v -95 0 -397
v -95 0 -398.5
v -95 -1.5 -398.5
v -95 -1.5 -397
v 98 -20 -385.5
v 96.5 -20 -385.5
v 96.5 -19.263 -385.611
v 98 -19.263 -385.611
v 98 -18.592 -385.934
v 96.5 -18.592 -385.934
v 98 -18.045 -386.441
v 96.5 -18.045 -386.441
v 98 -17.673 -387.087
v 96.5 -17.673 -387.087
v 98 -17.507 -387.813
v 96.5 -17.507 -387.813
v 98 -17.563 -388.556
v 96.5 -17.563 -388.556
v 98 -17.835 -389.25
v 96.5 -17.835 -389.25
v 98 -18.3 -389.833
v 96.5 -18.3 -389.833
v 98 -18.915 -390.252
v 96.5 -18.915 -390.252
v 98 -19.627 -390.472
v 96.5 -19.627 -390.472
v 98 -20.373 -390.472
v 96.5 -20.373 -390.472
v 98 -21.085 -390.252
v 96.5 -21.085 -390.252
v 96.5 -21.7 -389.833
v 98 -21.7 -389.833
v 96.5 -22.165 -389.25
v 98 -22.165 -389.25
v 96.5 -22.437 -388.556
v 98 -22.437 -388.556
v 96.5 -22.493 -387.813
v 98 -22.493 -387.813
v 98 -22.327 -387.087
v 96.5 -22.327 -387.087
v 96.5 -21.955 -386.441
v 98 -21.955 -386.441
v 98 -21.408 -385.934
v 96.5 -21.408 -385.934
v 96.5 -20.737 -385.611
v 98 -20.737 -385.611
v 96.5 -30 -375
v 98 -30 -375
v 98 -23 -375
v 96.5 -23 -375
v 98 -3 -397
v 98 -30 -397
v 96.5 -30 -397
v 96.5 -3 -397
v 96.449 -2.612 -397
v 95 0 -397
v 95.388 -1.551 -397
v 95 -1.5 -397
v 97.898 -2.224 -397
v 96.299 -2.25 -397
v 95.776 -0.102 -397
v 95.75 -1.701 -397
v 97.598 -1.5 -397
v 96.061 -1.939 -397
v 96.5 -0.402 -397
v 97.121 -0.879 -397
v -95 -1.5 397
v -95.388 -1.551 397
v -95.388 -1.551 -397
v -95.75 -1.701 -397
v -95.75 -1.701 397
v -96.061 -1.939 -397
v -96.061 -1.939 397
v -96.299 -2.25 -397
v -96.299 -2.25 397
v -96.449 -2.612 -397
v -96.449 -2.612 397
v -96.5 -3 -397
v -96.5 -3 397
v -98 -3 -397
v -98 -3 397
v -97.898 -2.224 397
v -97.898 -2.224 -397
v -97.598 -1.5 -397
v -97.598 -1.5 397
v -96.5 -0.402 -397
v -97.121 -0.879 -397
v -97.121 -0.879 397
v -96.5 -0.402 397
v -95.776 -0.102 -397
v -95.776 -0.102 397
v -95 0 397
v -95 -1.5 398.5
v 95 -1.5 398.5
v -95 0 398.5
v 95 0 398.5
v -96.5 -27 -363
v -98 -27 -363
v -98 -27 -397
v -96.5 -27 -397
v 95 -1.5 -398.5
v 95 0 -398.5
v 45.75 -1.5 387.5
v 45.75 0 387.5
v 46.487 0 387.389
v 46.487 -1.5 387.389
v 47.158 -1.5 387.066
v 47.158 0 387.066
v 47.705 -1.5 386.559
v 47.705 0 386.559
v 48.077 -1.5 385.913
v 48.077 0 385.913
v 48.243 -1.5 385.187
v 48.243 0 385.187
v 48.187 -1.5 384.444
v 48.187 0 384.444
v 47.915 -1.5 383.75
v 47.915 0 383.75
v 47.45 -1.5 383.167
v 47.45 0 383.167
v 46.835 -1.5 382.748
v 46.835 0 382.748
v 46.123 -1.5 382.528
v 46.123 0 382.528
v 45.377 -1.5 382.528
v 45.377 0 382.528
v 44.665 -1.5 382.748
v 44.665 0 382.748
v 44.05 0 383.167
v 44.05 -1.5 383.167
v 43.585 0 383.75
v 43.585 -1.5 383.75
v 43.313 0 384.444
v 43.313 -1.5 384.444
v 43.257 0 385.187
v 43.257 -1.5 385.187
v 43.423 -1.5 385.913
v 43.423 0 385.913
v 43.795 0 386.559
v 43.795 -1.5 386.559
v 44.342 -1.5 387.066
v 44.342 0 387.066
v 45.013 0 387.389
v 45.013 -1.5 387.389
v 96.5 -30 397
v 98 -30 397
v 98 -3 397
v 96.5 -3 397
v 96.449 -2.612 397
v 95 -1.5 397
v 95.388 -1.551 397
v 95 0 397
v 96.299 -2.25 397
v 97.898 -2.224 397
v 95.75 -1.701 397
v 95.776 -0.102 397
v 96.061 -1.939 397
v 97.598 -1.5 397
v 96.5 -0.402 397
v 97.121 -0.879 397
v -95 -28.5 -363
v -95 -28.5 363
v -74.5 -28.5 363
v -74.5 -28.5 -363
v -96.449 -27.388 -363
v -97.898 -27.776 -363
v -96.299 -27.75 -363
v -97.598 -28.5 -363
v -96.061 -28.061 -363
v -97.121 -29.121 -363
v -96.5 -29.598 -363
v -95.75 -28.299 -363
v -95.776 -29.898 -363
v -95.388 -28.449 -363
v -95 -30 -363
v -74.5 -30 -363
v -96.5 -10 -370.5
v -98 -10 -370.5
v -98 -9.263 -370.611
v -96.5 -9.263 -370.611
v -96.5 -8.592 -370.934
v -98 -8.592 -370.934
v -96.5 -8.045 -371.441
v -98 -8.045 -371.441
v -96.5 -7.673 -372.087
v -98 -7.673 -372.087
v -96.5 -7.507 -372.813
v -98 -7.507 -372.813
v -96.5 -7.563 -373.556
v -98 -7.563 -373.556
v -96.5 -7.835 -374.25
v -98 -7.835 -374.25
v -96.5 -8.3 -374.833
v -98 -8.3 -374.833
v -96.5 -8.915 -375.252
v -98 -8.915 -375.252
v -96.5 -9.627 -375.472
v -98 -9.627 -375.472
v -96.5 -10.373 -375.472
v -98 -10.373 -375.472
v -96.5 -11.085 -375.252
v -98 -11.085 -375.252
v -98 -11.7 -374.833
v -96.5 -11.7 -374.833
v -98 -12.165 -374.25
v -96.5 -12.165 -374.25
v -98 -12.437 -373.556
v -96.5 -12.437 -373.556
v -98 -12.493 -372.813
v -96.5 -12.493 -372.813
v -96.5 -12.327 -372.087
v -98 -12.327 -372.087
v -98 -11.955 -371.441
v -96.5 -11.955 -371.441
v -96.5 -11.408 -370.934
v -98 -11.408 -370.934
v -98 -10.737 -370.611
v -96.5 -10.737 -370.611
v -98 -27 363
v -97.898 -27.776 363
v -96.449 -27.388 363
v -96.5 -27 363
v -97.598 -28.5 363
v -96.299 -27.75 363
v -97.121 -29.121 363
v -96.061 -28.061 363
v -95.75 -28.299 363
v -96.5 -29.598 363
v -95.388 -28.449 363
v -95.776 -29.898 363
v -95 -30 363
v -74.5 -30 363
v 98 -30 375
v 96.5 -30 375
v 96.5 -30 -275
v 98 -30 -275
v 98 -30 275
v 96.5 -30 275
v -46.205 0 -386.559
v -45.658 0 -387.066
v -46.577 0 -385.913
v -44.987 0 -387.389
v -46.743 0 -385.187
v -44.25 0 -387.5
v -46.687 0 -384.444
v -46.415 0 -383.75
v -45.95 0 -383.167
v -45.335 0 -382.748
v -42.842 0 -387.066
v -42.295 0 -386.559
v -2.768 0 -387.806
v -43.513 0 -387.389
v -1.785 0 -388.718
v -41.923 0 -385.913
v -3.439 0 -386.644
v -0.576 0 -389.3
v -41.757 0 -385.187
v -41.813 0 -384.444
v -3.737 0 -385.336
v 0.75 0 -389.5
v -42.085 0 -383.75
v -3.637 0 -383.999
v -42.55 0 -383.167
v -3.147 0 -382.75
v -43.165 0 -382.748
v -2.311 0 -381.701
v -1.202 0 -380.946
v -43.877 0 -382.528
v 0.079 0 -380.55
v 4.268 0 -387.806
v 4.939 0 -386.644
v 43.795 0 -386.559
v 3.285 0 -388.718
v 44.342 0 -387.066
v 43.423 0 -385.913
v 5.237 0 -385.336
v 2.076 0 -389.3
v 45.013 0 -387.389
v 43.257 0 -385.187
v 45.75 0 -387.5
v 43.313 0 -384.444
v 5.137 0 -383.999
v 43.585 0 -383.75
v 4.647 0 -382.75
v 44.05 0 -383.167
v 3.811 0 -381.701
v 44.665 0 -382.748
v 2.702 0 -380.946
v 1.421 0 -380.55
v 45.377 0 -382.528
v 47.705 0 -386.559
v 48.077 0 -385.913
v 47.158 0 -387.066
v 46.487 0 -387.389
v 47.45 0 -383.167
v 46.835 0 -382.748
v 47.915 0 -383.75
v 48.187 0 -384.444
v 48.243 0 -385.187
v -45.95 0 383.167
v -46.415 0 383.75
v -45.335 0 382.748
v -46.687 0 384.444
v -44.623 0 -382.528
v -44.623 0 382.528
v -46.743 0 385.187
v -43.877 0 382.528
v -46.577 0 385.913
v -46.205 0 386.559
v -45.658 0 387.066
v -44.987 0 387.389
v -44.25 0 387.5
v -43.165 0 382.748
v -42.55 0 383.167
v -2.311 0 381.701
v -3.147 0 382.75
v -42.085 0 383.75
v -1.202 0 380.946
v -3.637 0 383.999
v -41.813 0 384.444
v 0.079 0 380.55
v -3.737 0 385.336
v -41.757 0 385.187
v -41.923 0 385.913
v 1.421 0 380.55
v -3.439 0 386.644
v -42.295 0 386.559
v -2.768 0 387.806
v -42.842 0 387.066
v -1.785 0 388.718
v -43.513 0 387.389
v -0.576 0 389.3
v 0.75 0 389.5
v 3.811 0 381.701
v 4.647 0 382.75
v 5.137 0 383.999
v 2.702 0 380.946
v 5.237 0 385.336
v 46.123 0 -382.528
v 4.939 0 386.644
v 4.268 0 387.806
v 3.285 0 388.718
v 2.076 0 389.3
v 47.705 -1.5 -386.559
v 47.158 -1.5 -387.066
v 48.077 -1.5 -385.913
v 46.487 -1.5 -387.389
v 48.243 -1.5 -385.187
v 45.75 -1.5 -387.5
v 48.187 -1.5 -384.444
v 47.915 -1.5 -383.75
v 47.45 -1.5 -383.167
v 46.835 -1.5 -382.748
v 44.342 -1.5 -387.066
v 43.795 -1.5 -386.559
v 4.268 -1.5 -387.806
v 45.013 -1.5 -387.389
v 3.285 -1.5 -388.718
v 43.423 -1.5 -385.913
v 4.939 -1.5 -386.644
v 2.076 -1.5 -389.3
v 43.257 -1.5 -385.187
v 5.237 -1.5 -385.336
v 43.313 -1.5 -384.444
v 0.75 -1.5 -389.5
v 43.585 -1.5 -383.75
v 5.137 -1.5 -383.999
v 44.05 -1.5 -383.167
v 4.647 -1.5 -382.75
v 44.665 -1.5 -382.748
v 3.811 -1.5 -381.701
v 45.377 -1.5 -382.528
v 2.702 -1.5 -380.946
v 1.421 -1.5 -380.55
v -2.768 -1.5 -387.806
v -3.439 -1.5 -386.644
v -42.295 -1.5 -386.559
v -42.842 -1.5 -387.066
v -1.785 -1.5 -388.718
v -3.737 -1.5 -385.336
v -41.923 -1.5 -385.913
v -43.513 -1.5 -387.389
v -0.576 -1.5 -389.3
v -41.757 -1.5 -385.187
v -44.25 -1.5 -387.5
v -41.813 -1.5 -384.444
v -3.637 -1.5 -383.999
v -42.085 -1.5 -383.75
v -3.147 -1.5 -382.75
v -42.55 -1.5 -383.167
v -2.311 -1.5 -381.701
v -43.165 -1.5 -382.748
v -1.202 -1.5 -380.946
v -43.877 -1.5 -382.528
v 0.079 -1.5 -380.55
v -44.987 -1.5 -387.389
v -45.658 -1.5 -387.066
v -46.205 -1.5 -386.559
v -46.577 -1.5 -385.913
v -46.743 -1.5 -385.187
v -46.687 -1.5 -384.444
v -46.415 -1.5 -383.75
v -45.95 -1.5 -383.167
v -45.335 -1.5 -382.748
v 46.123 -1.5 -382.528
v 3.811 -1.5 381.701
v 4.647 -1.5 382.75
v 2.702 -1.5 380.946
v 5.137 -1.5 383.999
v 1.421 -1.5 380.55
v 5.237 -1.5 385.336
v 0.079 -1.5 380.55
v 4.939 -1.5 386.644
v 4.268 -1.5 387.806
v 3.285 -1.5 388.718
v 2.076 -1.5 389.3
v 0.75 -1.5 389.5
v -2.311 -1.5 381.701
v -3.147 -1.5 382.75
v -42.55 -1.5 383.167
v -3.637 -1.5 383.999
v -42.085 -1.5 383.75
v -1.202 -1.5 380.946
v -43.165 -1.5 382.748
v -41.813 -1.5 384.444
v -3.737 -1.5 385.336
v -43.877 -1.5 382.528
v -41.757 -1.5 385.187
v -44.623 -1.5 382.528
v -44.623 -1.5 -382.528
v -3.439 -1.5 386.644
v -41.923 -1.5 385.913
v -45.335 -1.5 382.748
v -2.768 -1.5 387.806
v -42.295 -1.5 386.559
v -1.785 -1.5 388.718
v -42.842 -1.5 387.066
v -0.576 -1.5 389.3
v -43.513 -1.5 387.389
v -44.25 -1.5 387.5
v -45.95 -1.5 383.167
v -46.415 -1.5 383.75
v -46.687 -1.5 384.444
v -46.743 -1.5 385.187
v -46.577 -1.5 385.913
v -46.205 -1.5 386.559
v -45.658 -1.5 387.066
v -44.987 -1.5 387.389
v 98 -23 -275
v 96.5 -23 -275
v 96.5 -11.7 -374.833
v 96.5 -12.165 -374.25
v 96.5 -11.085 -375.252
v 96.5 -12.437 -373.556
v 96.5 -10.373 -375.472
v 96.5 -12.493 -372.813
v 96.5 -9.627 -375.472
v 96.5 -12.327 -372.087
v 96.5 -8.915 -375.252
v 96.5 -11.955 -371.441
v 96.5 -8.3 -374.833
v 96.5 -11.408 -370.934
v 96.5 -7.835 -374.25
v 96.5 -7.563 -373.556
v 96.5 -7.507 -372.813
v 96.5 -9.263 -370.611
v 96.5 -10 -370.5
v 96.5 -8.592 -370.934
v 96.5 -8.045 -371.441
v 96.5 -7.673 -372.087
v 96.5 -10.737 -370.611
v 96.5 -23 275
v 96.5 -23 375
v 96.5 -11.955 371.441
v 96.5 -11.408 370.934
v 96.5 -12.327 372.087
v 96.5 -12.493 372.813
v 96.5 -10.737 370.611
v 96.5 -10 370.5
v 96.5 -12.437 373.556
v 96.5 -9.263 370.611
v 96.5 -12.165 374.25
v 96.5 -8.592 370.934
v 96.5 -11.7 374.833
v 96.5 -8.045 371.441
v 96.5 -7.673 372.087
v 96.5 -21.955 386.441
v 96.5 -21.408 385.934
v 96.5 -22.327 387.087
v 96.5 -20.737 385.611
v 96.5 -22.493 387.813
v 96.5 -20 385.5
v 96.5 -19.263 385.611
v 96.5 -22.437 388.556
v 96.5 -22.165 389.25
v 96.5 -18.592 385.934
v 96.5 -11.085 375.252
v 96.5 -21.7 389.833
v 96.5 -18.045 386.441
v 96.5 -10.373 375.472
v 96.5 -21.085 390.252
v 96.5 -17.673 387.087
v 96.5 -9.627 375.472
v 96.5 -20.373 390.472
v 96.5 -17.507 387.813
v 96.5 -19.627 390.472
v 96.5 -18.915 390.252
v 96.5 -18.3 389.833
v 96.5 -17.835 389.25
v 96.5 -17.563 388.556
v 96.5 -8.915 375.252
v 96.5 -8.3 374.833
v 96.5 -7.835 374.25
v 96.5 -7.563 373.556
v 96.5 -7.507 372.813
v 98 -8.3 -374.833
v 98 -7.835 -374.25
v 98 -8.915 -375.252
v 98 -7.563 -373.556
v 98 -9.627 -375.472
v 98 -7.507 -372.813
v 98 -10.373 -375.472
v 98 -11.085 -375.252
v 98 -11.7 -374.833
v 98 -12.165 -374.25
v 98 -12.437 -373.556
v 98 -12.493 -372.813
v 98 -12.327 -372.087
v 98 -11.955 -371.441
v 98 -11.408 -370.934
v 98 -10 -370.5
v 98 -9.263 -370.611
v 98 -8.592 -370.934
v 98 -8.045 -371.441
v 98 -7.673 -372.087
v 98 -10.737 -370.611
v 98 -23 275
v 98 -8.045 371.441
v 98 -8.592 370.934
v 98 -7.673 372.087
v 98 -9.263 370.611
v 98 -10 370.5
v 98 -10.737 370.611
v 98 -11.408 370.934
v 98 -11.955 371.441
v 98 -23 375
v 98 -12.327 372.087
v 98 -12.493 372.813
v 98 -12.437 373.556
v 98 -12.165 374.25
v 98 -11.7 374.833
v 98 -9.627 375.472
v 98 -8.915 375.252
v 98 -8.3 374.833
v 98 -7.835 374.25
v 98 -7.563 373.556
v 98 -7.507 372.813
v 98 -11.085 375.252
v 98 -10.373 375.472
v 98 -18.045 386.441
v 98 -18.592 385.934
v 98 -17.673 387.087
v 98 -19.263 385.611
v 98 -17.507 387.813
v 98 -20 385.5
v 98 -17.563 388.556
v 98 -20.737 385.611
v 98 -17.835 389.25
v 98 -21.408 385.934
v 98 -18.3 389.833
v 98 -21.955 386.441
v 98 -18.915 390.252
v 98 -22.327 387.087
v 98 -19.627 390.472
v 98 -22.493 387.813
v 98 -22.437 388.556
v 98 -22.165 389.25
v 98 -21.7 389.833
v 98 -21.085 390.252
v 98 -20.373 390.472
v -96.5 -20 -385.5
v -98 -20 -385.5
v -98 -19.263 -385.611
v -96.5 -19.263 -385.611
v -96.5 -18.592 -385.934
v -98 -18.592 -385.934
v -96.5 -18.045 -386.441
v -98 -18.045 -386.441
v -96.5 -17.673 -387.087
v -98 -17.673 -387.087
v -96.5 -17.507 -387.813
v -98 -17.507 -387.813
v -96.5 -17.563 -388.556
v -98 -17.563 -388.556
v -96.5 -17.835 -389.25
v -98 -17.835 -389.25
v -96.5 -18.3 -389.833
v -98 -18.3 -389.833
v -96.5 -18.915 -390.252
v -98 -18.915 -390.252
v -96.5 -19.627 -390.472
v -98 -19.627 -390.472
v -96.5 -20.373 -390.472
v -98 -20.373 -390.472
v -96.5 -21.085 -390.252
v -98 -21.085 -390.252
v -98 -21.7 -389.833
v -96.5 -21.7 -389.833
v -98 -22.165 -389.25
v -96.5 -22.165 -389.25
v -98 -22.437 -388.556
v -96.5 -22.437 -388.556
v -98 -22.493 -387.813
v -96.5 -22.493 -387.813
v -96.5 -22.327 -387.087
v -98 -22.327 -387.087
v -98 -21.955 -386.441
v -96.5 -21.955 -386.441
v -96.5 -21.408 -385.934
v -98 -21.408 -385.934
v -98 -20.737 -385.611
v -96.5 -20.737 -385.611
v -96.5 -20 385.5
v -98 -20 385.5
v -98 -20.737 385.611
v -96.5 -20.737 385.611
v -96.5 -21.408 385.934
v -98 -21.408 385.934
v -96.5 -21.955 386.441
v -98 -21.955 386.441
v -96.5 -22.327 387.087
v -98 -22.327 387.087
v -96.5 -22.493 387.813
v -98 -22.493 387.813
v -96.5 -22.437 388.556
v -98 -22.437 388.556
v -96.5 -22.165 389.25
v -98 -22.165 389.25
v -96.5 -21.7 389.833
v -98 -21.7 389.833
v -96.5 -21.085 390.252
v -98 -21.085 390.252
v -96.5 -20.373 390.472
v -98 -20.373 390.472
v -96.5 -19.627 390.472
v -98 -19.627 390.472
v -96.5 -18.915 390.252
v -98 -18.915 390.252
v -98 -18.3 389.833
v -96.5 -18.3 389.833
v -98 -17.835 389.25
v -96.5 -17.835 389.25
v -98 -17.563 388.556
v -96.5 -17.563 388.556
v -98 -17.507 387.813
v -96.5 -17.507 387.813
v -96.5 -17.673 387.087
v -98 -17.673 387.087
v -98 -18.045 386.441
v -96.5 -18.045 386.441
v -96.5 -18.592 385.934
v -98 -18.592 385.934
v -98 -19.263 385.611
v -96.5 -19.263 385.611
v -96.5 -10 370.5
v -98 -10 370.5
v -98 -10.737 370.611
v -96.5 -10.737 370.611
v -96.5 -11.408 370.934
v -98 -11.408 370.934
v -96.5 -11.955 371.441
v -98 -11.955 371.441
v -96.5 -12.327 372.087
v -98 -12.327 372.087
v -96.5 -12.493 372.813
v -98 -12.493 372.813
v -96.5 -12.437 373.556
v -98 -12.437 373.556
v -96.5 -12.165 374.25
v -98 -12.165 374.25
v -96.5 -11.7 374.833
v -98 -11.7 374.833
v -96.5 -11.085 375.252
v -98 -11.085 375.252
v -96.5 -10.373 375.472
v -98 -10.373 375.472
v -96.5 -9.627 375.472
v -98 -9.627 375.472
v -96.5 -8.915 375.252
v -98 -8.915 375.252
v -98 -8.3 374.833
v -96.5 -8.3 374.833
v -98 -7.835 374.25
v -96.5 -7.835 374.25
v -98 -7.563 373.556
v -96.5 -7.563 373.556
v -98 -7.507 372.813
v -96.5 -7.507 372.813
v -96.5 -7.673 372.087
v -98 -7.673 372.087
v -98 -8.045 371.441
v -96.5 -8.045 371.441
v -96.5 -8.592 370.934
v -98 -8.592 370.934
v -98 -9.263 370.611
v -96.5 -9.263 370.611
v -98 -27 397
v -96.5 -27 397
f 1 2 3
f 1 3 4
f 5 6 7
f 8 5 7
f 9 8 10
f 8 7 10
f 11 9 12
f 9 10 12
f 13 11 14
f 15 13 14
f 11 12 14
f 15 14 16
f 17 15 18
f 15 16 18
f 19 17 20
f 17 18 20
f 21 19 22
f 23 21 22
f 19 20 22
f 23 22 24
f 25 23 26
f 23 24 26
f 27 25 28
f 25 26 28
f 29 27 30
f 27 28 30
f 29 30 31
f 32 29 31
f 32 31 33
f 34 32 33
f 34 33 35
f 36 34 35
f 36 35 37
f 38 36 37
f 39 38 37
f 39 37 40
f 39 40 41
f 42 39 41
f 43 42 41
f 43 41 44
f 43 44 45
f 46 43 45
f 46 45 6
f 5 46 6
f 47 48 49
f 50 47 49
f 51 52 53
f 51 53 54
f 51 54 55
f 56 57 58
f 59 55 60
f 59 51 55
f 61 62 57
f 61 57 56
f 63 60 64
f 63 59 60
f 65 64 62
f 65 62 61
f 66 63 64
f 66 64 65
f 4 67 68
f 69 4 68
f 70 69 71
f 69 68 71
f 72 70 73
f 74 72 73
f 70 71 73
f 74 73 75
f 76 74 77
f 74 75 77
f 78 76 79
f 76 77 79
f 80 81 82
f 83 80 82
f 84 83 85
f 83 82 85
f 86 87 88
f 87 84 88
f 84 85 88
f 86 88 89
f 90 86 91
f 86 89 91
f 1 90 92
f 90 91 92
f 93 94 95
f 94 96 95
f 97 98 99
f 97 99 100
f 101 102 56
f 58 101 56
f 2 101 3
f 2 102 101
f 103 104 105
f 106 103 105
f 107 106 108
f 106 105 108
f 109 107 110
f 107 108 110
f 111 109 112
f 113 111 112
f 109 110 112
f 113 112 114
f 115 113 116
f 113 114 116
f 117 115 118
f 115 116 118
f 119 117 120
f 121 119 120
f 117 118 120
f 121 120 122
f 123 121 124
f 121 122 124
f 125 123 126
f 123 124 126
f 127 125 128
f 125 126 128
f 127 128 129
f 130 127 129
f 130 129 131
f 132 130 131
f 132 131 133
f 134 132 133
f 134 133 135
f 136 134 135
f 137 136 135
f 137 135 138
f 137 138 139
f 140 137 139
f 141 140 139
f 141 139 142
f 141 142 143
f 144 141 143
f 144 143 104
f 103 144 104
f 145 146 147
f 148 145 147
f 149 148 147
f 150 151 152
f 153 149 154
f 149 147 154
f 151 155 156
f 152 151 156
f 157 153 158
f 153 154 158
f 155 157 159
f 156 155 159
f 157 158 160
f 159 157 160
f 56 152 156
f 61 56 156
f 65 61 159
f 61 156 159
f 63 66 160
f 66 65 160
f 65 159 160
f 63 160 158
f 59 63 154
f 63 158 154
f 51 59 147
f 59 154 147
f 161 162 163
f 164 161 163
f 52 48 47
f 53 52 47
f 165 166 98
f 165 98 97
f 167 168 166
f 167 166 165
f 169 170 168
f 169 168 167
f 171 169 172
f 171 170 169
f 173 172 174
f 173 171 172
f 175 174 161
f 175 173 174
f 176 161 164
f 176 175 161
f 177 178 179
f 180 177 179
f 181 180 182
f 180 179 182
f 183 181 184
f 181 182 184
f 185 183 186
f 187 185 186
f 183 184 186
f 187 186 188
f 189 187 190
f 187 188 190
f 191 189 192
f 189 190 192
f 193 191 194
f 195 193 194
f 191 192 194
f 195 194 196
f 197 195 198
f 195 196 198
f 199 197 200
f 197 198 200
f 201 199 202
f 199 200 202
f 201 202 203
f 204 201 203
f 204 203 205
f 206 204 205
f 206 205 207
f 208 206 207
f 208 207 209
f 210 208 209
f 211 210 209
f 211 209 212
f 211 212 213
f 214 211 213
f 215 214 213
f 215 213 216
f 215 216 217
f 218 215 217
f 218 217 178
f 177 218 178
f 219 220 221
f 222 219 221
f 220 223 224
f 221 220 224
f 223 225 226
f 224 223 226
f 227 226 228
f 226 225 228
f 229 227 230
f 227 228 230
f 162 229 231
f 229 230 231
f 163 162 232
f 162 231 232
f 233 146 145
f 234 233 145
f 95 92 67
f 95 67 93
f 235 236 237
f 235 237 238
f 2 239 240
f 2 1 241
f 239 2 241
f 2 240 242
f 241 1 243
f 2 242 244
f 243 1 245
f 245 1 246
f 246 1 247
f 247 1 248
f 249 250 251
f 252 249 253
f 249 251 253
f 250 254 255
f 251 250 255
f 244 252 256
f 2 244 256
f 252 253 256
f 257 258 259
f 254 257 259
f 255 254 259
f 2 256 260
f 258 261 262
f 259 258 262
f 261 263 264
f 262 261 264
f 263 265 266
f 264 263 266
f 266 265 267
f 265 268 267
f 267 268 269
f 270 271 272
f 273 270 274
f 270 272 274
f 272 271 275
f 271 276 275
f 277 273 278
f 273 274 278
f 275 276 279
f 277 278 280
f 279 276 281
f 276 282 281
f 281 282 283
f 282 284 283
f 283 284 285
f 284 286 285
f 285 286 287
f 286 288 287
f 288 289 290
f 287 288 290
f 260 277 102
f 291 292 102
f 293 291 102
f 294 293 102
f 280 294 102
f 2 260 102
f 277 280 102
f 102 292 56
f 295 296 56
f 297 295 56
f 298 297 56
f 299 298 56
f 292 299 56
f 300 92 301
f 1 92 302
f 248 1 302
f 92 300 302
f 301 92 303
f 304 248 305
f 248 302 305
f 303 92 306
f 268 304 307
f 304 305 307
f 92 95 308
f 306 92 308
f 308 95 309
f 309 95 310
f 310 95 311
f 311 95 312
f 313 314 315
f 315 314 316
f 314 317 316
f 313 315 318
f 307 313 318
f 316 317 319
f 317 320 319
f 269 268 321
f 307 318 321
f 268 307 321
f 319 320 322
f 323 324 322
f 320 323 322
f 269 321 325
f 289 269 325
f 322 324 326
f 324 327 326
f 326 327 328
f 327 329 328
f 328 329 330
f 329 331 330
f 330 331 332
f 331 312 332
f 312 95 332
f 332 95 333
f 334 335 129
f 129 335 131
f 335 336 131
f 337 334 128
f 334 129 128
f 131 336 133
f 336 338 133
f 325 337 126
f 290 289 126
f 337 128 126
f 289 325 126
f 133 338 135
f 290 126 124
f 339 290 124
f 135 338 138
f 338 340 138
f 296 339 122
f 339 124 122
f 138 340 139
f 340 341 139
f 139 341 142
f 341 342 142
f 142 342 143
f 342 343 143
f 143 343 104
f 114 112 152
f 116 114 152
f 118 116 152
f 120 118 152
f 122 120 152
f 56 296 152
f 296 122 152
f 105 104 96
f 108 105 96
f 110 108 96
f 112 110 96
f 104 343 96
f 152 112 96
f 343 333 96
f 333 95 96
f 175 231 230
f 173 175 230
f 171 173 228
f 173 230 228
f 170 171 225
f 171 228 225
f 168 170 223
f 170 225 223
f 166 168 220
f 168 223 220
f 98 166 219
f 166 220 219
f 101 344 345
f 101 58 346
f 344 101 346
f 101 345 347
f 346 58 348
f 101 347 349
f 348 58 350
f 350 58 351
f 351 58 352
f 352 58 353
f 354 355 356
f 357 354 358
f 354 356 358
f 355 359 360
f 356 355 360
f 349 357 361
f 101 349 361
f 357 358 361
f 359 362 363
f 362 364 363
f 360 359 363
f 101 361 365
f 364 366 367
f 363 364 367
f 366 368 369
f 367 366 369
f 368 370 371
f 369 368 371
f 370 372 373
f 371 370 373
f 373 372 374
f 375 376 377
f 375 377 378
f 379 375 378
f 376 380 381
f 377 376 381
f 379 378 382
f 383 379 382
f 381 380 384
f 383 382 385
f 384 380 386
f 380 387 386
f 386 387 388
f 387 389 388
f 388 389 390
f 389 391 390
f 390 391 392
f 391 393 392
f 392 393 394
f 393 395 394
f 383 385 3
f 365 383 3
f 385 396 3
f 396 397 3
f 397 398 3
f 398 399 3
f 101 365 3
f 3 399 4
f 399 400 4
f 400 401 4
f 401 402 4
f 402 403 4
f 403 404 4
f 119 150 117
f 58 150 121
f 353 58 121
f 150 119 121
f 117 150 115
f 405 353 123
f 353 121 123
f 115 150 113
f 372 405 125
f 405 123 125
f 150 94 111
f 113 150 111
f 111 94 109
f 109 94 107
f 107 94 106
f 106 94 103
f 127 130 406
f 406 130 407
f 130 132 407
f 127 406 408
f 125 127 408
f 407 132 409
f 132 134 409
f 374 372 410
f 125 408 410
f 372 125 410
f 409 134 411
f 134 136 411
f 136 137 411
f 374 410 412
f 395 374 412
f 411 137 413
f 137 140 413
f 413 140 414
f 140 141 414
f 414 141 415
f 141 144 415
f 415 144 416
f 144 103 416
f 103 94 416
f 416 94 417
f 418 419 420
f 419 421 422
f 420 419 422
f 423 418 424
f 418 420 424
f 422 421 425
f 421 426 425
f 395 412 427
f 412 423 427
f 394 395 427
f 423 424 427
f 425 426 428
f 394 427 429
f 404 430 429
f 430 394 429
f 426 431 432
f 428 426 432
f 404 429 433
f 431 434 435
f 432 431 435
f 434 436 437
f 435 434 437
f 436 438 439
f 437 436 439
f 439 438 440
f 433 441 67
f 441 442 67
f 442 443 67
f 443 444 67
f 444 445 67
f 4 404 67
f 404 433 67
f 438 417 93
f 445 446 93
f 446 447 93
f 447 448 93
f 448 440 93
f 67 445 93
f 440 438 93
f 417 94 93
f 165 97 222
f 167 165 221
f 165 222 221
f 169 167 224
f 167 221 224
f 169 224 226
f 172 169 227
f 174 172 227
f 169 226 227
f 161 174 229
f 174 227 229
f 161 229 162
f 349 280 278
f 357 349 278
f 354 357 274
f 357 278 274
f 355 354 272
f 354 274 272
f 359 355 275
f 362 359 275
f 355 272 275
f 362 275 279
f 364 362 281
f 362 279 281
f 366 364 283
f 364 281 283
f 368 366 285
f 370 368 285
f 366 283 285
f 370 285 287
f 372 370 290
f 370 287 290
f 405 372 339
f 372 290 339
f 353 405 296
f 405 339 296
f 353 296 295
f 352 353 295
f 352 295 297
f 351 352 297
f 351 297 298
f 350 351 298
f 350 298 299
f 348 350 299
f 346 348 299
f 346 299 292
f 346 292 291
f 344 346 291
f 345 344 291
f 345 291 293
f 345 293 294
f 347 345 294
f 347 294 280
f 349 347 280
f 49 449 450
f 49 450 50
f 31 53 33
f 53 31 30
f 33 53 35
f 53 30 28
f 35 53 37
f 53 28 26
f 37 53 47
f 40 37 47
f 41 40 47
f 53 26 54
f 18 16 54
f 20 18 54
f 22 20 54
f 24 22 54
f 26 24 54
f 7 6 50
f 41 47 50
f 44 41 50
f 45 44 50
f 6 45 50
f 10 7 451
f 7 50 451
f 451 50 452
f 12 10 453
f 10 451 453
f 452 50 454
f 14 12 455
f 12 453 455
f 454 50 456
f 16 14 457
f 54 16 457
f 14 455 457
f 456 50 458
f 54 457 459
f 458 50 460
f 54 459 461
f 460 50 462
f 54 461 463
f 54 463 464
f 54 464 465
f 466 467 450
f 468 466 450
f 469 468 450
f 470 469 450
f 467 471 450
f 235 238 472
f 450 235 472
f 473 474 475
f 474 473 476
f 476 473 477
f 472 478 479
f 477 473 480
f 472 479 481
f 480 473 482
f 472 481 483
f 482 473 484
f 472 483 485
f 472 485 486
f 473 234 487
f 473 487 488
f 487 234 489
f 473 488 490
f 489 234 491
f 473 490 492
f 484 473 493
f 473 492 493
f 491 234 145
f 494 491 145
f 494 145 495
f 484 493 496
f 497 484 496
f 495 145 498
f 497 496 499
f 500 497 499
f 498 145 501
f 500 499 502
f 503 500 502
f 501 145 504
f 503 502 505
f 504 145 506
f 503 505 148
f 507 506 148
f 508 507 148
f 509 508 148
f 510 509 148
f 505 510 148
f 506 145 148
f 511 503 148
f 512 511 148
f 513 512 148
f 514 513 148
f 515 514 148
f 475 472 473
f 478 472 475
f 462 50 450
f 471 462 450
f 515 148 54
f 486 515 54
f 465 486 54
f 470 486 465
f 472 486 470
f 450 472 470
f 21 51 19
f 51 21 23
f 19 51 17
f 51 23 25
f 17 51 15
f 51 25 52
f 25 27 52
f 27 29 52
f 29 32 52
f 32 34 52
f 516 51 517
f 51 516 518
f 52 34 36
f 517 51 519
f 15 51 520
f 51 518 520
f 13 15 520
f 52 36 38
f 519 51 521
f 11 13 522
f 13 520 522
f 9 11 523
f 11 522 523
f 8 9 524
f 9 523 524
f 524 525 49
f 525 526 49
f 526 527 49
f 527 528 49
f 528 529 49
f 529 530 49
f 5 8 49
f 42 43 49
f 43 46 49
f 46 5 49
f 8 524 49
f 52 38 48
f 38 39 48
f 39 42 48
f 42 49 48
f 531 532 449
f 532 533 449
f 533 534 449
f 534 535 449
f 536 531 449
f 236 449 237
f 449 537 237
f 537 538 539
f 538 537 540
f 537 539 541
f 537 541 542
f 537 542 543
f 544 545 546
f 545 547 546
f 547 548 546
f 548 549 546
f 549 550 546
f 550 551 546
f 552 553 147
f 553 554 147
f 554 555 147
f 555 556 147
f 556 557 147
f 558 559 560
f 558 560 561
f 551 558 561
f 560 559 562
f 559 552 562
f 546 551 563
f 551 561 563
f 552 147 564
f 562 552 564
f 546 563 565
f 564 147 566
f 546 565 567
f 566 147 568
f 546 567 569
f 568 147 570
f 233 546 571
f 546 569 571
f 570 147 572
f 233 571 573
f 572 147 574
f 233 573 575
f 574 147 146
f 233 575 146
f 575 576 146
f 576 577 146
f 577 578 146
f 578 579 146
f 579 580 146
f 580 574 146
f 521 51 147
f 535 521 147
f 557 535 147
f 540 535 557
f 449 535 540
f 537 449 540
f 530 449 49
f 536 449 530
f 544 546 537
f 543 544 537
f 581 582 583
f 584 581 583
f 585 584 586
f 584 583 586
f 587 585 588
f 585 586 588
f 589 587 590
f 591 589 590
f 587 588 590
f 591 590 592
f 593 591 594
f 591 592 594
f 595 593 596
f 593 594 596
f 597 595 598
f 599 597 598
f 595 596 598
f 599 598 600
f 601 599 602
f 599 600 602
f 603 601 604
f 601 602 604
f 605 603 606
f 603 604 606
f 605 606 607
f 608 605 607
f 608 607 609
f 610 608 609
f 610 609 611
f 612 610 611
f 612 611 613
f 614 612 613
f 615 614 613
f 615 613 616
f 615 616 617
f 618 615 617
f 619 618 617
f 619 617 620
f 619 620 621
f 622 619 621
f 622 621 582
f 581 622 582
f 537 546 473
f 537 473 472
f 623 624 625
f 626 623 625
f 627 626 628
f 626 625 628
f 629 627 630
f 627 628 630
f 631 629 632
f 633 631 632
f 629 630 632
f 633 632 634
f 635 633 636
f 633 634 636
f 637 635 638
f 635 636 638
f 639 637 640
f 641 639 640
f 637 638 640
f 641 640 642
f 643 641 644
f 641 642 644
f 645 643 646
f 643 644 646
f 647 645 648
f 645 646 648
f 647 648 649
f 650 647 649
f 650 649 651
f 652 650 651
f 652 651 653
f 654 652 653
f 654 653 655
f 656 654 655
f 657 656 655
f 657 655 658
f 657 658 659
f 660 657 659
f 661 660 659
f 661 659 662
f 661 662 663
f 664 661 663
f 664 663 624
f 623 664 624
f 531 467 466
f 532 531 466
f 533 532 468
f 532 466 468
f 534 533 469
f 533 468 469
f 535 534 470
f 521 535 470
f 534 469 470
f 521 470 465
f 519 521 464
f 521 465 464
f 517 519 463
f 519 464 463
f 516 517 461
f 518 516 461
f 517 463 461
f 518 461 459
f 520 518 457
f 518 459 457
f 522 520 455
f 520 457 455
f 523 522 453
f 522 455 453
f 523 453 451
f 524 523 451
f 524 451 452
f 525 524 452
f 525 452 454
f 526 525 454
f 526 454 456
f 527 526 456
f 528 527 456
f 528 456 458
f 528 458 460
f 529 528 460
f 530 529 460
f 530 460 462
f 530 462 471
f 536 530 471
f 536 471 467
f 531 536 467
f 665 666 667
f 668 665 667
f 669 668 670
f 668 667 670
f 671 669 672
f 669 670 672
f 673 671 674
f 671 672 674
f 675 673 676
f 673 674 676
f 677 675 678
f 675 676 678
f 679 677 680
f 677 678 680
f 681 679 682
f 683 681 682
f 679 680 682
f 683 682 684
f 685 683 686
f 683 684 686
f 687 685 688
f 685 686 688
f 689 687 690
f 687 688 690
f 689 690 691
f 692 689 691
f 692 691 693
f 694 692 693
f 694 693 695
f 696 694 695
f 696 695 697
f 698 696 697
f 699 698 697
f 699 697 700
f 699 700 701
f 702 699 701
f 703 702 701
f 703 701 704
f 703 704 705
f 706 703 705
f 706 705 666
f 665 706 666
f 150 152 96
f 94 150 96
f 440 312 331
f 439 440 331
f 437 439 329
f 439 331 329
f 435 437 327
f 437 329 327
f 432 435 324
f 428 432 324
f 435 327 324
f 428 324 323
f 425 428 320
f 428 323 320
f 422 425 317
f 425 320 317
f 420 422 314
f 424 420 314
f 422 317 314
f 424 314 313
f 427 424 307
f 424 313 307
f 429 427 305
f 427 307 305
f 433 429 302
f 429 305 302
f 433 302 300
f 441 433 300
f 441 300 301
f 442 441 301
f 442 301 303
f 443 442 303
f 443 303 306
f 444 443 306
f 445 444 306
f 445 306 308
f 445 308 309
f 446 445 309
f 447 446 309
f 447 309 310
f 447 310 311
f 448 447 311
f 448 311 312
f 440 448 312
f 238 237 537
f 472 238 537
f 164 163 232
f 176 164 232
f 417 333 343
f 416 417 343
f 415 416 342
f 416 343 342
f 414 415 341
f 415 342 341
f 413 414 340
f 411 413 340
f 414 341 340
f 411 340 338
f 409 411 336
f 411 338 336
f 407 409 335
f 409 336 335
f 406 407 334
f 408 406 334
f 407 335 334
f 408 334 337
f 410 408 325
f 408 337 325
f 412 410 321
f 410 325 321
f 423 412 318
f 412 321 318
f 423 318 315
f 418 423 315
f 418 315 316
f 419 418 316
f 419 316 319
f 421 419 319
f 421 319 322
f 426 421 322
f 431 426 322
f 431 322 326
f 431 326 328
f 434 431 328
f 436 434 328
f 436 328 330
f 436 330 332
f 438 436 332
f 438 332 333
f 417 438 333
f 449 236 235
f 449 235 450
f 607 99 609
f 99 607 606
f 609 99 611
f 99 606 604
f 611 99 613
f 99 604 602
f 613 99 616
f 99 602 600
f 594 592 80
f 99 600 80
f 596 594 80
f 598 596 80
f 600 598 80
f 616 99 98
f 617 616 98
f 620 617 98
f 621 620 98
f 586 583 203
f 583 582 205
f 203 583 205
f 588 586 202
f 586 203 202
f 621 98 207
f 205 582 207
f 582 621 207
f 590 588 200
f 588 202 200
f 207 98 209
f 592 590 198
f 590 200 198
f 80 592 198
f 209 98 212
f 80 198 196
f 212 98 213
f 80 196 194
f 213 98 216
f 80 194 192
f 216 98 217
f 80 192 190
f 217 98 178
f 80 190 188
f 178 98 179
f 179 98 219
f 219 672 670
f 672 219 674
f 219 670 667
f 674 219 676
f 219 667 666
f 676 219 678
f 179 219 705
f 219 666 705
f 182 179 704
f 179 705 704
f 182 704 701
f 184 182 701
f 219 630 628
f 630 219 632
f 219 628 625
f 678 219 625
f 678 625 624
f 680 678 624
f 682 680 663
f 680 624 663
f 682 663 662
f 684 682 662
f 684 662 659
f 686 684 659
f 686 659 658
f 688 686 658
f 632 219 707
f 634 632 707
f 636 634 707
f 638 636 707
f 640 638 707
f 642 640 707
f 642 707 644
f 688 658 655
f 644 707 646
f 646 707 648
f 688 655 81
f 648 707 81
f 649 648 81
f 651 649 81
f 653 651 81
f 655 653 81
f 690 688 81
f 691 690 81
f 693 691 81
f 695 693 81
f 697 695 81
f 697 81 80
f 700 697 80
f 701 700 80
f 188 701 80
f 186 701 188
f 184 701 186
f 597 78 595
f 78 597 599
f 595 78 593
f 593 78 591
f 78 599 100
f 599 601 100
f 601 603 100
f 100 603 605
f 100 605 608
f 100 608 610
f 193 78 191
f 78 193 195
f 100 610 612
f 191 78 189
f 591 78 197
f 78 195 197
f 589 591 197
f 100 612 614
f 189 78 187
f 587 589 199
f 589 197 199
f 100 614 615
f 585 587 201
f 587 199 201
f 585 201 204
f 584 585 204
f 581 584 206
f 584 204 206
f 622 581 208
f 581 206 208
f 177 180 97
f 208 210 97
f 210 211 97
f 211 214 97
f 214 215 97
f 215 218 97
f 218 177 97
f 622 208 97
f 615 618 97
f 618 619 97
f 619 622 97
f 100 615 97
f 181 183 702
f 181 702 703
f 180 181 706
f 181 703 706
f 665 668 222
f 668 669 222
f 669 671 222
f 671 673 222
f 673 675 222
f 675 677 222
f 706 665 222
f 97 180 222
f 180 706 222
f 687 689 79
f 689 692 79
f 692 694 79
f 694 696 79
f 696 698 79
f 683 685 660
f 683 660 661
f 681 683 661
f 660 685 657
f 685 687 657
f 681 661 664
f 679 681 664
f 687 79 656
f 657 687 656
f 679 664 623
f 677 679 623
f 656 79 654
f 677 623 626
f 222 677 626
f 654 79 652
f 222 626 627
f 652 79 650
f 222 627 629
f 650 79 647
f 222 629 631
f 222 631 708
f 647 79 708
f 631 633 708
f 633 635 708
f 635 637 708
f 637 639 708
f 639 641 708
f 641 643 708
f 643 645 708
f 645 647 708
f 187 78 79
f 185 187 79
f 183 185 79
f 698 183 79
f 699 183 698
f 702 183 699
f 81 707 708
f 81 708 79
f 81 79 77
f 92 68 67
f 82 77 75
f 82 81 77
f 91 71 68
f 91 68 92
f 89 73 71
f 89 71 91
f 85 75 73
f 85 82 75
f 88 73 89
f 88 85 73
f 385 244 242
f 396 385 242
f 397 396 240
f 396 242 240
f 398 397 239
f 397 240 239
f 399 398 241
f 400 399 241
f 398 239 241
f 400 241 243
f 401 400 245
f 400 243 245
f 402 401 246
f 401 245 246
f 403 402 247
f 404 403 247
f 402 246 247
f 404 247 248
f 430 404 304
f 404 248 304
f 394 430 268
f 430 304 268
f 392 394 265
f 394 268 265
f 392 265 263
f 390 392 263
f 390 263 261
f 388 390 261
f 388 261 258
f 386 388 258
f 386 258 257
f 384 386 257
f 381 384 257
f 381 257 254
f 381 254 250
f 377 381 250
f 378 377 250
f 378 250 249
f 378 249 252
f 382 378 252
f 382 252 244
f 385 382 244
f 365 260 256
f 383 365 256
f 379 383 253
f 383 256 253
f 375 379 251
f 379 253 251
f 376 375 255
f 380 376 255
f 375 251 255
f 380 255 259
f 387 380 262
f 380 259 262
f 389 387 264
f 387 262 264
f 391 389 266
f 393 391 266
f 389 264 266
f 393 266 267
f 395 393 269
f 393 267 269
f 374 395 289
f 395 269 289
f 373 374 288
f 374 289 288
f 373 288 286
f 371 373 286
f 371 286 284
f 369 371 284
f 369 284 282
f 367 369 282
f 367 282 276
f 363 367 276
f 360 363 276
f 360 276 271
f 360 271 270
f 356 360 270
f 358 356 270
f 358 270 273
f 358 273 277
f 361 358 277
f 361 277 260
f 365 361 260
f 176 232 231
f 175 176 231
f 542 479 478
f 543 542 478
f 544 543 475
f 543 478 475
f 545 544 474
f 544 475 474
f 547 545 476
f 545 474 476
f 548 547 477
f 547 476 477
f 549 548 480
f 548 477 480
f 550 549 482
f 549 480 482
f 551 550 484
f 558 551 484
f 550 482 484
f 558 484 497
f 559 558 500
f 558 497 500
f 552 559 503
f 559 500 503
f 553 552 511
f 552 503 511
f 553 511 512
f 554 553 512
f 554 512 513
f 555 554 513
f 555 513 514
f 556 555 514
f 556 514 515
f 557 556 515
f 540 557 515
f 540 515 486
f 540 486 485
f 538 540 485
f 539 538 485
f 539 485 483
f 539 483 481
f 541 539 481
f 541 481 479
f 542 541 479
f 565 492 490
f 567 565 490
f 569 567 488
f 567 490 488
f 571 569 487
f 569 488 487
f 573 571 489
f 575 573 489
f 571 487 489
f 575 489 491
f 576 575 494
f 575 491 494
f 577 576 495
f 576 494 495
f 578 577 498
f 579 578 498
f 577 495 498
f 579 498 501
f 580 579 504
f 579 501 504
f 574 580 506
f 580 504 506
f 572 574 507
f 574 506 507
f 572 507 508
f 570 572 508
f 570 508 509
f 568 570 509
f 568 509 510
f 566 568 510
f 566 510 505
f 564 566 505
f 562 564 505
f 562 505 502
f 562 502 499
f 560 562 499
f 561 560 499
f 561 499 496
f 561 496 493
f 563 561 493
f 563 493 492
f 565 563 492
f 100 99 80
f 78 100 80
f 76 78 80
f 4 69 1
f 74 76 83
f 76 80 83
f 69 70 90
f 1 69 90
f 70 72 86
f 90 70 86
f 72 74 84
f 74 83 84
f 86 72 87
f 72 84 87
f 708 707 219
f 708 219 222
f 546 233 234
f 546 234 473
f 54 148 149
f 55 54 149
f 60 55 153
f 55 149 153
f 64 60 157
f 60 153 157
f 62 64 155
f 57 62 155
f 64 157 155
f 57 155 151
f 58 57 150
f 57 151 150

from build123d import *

# Parameters (mm, degrees)
SM_BASE_FLANGE_1_DEPTH = 398.5
SKETCH_6_W             = 1.5
SKETCH_6_H             = 30
CUT_EXTRUDE_1_DEPTH    = 3
SKETCH_7_W             = 23.5
SKETCH_7_H             = 35.5
CUT_EXTRUDE_2_DEPTH    = 3
SKETCH_8_R             = 2.5
CUT_EXTRUDE_3_DEPTH    = 446.104762949
SKETCH_10_R            = 2.5
SKETCH_10_R_2          = 4.5
CUT_EXTRUDE_4_DEPTH    = 10
SKETCH_11_W            = 100
SKETCH_11_H            = 7
CUT_EXTRUDE_2108_DEPTH = 10


# Sheet-metal steps are written as plain solids
with BuildPart() as part:
    # Sketch 1 → Базовая кромка1 (new, symmetric)
    with BuildSketch(Plane.XY):
        with BuildLine():
            Line((-74.5, -30), (-95, -30))
            ThreePointArc((-95, -30), (-97.121320344, -29.121320344), (-98, -27))
            Line((-98, -27), (-98, -3))
            ThreePointArc((-98, -3), (-97.121320344, -0.878679656), (-95, 0))
            Line((-95, 0), (95, 0))
            ThreePointArc((95, 0), (97.121320344, -0.878679656), (98, -3))
            Line((98, -3), (98, -30))
            Line((98, -30), (96.5, -30))
            Line((96.5, -30), (96.5, -3))
            ThreePointArc((96.5, -3), (96.060660172, -1.939339828), (95, -1.5))
            Line((95, -1.5), (-95, -1.5))
            ThreePointArc((-95, -1.5), (-96.060660172, -1.939339828), (-96.5, -3))
            Line((-96.5, -3), (-96.5, -27))
            ThreePointArc((-96.5, -27), (-96.060660172, -28.060660172), (-95, -28.5))
            Line((-95, -28.5), (-74.5, -28.5))
            Line((-74.5, -28.5), (-74.5, -30))
        make_face()
    extrude(amount=SM_BASE_FLANGE_1_DEPTH, both=True)

    # Эскиз6 → Вырез-Вытянуть1 (cut)
    with BuildSketch(Plane.ZY.offset(98)):
        with Locations((397.75, -15)):
            Rectangle(SKETCH_6_W, SKETCH_6_H)
        with Locations((-397.75, -15)):
            Rectangle(SKETCH_6_W, SKETCH_6_H)
    cut_extrude_1 = extrude(amount=-CUT_EXTRUDE_1_DEPTH, mode=Mode.SUBTRACT)

    # Зеркальное отражение1: Вырез-Вытянуть1 across plane
    add(cut_extrude_1.mirror(Plane(origin=(0, 0, 0), x_dir=(0, 0, 1), z_dir=(1, 0, 0))), mode=Mode.SUBTRACT)

    # Эскиз7 → Вырез-Вытянуть2 (cut)
    with BuildSketch(Plane.XZ.offset(30)):
        with Locations((-86.25, 380.75)):
            Rectangle(SKETCH_7_W, SKETCH_7_H)
        with Locations((-86.25, -380.75)):
            Rectangle(SKETCH_7_W, SKETCH_7_H)
    extrude(amount=-CUT_EXTRUDE_2_DEPTH, mode=Mode.SUBTRACT)

    # Эскиз8 → Вырез-Вытянуть3 (cut, through all)
    with BuildSketch(Plane.ZY.offset(98)):
        with Locations((-388, -20)):
            Circle(SKETCH_8_R)
        with Locations((-373, -10)):
            Circle(SKETCH_8_R)
        with Locations(Location((373, -10, 0), (0, 0, 180))):
            Circle(SKETCH_8_R)
        with Locations(Location((388, -20, 0), (0, 0, 180))):
            Circle(SKETCH_8_R)
    extrude(amount=-CUT_EXTRUDE_3_DEPTH, mode=Mode.SUBTRACT)

    # Эскиз10 → Вырез-Вытянуть4 (cut)
    with BuildSketch(Plane(origin=(0, 0, 0), x_dir=(1, 0, 0), z_dir=(0, 1, 0))):
        with Locations(Location((-44.25, -385, 0), (0, 0, 270))):
            Circle(SKETCH_10_R)
        with Locations(Location((0.75, -385, 0), (0, 0, 270))):
            Circle(SKETCH_10_R_2)
        with Locations(Location((45.75, -385, 0), (0, 0, 270))):
            Circle(SKETCH_10_R)
        with Locations(Location((45.75, 385, 0), (0, 0, 90))):
            Circle(SKETCH_10_R)
        with Locations(Location((0.75, 385, 0), (0, 0, 90))):
            Circle(SKETCH_10_R_2)
        with Locations(Location((-44.25, 385, 0), (0, 0, 90))):
            Circle(SKETCH_10_R)
    extrude(amount=-CUT_EXTRUDE_4_DEPTH, mode=Mode.SUBTRACT)

    # Эскиз11 → Cut-Extrude 2108 (cut)
    with BuildSketch(Plane(origin=(98, 0, 0), x_dir=(0, 0, -1), z_dir=(1, 0, 0))):
        with Locations((325, -26.5)):
            Rectangle(SKETCH_11_W, SKETCH_11_H)
        with Locations((-325, -26.5)):
            Rectangle(SKETCH_11_W, SKETCH_11_H)
    extrude(amount=-CUT_EXTRUDE_2108_DEPTH, mode=Mode.SUBTRACT)


solid = part.part
